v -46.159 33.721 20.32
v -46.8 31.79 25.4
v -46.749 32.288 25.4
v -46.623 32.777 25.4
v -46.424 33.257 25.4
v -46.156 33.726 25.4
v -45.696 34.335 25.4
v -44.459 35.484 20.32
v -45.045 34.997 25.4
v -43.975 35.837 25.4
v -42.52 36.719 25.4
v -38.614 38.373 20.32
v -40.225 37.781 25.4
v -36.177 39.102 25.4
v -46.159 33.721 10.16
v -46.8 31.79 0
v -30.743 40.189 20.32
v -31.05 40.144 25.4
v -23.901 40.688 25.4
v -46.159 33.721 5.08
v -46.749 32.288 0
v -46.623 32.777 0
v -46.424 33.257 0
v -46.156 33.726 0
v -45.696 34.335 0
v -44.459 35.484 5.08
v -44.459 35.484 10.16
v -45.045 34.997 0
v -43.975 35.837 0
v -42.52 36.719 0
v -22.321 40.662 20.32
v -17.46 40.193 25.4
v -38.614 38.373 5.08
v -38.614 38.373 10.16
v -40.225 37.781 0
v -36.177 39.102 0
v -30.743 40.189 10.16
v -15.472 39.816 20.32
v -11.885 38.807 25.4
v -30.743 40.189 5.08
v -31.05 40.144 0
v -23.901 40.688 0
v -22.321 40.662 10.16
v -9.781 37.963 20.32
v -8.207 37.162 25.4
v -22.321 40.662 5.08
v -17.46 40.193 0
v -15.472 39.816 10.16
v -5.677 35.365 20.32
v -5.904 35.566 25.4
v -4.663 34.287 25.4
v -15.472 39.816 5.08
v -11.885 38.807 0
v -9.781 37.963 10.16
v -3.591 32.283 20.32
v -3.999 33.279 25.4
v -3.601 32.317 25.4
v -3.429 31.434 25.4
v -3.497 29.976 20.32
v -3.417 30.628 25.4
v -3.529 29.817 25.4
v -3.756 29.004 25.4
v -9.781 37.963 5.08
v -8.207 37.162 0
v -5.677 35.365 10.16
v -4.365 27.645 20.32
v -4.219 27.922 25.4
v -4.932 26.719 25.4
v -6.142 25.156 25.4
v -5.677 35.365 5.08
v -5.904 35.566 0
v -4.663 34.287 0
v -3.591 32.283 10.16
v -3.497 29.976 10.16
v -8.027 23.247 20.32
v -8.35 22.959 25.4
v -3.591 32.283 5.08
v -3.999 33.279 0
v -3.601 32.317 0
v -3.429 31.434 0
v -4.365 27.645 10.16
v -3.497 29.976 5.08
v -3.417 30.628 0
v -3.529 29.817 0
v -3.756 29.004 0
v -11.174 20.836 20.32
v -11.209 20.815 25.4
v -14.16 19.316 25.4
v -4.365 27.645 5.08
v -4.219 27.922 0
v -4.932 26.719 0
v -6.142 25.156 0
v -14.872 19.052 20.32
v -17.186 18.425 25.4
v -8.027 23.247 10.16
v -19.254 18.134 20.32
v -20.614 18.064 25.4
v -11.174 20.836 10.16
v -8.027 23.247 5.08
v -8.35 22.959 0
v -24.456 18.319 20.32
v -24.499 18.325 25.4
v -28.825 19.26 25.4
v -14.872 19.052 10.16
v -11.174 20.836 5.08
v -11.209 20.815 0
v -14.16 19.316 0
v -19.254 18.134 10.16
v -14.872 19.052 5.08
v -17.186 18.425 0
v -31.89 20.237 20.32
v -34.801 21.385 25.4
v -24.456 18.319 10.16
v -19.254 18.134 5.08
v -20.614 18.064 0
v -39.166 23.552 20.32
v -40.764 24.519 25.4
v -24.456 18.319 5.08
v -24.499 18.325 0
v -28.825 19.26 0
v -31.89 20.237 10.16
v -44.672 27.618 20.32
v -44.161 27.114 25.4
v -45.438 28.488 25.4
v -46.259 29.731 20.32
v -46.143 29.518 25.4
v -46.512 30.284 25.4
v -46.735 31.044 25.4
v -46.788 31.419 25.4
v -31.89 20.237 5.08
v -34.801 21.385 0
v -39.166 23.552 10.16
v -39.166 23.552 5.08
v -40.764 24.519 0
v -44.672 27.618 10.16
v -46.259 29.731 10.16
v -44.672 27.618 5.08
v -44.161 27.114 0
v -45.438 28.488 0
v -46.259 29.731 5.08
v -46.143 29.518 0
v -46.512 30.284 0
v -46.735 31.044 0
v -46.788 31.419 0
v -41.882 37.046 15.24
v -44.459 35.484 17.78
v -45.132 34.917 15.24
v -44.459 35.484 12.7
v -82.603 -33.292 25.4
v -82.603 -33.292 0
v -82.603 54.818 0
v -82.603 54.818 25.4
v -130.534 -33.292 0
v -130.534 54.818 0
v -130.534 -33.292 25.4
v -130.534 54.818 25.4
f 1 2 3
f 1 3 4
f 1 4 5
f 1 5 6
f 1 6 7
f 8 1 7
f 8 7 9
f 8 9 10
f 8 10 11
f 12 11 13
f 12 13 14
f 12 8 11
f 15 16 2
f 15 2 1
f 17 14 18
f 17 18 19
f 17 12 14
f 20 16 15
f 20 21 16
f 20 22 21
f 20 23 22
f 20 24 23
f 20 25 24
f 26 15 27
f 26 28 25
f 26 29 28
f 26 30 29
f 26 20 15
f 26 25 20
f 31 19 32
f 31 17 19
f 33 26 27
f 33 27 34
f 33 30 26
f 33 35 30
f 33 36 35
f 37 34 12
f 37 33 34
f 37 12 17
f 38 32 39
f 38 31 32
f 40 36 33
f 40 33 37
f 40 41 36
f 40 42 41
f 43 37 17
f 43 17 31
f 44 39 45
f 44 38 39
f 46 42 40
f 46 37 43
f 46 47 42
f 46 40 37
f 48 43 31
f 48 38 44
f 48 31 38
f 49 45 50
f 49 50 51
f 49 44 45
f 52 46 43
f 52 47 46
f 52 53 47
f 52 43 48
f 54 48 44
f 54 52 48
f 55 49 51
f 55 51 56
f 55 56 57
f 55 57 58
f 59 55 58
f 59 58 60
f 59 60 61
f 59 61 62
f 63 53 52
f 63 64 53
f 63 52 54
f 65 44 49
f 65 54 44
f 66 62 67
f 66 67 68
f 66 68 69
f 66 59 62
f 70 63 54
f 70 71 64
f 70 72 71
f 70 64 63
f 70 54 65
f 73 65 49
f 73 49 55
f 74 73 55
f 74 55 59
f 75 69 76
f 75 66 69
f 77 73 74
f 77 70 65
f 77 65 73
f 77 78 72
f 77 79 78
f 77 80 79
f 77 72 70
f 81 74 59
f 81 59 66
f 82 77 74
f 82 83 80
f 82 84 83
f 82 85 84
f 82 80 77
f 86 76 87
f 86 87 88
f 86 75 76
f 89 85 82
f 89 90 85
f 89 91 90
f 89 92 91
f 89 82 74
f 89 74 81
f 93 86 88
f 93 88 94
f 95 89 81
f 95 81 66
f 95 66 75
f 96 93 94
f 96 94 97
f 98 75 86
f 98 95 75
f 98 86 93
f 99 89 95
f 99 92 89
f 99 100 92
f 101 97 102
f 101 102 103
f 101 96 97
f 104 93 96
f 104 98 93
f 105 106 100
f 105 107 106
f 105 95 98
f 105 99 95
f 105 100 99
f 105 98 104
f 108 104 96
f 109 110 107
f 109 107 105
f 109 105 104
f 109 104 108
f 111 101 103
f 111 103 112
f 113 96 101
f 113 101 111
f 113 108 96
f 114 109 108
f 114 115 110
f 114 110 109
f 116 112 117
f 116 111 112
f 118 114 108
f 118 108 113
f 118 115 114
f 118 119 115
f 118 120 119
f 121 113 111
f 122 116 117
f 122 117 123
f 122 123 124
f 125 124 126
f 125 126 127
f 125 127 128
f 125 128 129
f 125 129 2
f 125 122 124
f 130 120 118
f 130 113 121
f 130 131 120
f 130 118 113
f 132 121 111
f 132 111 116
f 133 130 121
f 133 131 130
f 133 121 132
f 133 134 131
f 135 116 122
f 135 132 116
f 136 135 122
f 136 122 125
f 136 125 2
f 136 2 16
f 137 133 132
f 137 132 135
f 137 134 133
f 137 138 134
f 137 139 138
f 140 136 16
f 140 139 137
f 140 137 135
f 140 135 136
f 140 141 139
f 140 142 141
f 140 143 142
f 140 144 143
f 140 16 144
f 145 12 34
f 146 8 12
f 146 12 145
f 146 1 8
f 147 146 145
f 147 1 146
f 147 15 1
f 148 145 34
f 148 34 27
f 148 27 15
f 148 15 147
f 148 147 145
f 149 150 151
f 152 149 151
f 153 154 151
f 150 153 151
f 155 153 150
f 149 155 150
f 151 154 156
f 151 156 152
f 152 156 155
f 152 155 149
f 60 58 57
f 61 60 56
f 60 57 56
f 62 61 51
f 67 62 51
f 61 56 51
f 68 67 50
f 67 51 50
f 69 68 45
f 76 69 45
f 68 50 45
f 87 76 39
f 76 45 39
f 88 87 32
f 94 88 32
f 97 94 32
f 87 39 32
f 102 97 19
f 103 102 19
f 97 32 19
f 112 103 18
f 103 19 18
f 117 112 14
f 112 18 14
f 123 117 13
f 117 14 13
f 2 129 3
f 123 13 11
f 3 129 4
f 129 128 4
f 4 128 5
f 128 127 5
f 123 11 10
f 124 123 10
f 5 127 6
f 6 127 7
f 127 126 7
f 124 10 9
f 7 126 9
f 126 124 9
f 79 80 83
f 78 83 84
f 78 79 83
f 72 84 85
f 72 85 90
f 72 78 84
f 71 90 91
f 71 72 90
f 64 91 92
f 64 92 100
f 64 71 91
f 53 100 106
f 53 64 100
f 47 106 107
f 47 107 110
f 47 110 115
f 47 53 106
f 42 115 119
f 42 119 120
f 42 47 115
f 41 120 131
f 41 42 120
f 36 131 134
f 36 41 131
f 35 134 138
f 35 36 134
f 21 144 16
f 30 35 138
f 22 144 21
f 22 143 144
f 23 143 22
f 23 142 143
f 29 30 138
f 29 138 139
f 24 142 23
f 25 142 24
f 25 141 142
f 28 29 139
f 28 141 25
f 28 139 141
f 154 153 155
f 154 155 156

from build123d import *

# Parameters (mm, degrees)
F0_W     = 47.9313209653
F0_H     = 88.1093591452
F1_DEPTH = 25.4
F2_DEPTH = 25.4


with BuildPart() as f1:
    # F0 (on Top) → F1 (new body)
    with BuildSketch(Plane.XY):
        with Locations((-106.5687350929, 10.7631236315)):
            Rectangle(F0_W, F0_H)
    extrude(amount=F1_DEPTH)


with BuildPart() as f2:
    # F0 (on Top) → F2 (new body)
    with BuildSketch(Plane.XY):
        with BuildLine():
            add(Edge.make_bspline(
                [(-46.8000434339, 31.790420413), (-46.6693138878, 37.1332195923), (-21.3611000813, 44.5176922804), (0.6059233997, 33.9893032679), (-8.0878408227, 21.6265576062), (-23.0780288911, 14.1610088325), (-46.9309067974, 26.4421522351), (-46.8000434339, 31.790420413)],
                knots=[0, 0, 0, 0, 0.2313667143, 0.4367519565, 0.5806094528, 0.768396454, 1, 1, 1, 1], degree=3))
        make_face()
    extrude(amount=F2_DEPTH)


solid = Compound([f1.part, f2.part])
